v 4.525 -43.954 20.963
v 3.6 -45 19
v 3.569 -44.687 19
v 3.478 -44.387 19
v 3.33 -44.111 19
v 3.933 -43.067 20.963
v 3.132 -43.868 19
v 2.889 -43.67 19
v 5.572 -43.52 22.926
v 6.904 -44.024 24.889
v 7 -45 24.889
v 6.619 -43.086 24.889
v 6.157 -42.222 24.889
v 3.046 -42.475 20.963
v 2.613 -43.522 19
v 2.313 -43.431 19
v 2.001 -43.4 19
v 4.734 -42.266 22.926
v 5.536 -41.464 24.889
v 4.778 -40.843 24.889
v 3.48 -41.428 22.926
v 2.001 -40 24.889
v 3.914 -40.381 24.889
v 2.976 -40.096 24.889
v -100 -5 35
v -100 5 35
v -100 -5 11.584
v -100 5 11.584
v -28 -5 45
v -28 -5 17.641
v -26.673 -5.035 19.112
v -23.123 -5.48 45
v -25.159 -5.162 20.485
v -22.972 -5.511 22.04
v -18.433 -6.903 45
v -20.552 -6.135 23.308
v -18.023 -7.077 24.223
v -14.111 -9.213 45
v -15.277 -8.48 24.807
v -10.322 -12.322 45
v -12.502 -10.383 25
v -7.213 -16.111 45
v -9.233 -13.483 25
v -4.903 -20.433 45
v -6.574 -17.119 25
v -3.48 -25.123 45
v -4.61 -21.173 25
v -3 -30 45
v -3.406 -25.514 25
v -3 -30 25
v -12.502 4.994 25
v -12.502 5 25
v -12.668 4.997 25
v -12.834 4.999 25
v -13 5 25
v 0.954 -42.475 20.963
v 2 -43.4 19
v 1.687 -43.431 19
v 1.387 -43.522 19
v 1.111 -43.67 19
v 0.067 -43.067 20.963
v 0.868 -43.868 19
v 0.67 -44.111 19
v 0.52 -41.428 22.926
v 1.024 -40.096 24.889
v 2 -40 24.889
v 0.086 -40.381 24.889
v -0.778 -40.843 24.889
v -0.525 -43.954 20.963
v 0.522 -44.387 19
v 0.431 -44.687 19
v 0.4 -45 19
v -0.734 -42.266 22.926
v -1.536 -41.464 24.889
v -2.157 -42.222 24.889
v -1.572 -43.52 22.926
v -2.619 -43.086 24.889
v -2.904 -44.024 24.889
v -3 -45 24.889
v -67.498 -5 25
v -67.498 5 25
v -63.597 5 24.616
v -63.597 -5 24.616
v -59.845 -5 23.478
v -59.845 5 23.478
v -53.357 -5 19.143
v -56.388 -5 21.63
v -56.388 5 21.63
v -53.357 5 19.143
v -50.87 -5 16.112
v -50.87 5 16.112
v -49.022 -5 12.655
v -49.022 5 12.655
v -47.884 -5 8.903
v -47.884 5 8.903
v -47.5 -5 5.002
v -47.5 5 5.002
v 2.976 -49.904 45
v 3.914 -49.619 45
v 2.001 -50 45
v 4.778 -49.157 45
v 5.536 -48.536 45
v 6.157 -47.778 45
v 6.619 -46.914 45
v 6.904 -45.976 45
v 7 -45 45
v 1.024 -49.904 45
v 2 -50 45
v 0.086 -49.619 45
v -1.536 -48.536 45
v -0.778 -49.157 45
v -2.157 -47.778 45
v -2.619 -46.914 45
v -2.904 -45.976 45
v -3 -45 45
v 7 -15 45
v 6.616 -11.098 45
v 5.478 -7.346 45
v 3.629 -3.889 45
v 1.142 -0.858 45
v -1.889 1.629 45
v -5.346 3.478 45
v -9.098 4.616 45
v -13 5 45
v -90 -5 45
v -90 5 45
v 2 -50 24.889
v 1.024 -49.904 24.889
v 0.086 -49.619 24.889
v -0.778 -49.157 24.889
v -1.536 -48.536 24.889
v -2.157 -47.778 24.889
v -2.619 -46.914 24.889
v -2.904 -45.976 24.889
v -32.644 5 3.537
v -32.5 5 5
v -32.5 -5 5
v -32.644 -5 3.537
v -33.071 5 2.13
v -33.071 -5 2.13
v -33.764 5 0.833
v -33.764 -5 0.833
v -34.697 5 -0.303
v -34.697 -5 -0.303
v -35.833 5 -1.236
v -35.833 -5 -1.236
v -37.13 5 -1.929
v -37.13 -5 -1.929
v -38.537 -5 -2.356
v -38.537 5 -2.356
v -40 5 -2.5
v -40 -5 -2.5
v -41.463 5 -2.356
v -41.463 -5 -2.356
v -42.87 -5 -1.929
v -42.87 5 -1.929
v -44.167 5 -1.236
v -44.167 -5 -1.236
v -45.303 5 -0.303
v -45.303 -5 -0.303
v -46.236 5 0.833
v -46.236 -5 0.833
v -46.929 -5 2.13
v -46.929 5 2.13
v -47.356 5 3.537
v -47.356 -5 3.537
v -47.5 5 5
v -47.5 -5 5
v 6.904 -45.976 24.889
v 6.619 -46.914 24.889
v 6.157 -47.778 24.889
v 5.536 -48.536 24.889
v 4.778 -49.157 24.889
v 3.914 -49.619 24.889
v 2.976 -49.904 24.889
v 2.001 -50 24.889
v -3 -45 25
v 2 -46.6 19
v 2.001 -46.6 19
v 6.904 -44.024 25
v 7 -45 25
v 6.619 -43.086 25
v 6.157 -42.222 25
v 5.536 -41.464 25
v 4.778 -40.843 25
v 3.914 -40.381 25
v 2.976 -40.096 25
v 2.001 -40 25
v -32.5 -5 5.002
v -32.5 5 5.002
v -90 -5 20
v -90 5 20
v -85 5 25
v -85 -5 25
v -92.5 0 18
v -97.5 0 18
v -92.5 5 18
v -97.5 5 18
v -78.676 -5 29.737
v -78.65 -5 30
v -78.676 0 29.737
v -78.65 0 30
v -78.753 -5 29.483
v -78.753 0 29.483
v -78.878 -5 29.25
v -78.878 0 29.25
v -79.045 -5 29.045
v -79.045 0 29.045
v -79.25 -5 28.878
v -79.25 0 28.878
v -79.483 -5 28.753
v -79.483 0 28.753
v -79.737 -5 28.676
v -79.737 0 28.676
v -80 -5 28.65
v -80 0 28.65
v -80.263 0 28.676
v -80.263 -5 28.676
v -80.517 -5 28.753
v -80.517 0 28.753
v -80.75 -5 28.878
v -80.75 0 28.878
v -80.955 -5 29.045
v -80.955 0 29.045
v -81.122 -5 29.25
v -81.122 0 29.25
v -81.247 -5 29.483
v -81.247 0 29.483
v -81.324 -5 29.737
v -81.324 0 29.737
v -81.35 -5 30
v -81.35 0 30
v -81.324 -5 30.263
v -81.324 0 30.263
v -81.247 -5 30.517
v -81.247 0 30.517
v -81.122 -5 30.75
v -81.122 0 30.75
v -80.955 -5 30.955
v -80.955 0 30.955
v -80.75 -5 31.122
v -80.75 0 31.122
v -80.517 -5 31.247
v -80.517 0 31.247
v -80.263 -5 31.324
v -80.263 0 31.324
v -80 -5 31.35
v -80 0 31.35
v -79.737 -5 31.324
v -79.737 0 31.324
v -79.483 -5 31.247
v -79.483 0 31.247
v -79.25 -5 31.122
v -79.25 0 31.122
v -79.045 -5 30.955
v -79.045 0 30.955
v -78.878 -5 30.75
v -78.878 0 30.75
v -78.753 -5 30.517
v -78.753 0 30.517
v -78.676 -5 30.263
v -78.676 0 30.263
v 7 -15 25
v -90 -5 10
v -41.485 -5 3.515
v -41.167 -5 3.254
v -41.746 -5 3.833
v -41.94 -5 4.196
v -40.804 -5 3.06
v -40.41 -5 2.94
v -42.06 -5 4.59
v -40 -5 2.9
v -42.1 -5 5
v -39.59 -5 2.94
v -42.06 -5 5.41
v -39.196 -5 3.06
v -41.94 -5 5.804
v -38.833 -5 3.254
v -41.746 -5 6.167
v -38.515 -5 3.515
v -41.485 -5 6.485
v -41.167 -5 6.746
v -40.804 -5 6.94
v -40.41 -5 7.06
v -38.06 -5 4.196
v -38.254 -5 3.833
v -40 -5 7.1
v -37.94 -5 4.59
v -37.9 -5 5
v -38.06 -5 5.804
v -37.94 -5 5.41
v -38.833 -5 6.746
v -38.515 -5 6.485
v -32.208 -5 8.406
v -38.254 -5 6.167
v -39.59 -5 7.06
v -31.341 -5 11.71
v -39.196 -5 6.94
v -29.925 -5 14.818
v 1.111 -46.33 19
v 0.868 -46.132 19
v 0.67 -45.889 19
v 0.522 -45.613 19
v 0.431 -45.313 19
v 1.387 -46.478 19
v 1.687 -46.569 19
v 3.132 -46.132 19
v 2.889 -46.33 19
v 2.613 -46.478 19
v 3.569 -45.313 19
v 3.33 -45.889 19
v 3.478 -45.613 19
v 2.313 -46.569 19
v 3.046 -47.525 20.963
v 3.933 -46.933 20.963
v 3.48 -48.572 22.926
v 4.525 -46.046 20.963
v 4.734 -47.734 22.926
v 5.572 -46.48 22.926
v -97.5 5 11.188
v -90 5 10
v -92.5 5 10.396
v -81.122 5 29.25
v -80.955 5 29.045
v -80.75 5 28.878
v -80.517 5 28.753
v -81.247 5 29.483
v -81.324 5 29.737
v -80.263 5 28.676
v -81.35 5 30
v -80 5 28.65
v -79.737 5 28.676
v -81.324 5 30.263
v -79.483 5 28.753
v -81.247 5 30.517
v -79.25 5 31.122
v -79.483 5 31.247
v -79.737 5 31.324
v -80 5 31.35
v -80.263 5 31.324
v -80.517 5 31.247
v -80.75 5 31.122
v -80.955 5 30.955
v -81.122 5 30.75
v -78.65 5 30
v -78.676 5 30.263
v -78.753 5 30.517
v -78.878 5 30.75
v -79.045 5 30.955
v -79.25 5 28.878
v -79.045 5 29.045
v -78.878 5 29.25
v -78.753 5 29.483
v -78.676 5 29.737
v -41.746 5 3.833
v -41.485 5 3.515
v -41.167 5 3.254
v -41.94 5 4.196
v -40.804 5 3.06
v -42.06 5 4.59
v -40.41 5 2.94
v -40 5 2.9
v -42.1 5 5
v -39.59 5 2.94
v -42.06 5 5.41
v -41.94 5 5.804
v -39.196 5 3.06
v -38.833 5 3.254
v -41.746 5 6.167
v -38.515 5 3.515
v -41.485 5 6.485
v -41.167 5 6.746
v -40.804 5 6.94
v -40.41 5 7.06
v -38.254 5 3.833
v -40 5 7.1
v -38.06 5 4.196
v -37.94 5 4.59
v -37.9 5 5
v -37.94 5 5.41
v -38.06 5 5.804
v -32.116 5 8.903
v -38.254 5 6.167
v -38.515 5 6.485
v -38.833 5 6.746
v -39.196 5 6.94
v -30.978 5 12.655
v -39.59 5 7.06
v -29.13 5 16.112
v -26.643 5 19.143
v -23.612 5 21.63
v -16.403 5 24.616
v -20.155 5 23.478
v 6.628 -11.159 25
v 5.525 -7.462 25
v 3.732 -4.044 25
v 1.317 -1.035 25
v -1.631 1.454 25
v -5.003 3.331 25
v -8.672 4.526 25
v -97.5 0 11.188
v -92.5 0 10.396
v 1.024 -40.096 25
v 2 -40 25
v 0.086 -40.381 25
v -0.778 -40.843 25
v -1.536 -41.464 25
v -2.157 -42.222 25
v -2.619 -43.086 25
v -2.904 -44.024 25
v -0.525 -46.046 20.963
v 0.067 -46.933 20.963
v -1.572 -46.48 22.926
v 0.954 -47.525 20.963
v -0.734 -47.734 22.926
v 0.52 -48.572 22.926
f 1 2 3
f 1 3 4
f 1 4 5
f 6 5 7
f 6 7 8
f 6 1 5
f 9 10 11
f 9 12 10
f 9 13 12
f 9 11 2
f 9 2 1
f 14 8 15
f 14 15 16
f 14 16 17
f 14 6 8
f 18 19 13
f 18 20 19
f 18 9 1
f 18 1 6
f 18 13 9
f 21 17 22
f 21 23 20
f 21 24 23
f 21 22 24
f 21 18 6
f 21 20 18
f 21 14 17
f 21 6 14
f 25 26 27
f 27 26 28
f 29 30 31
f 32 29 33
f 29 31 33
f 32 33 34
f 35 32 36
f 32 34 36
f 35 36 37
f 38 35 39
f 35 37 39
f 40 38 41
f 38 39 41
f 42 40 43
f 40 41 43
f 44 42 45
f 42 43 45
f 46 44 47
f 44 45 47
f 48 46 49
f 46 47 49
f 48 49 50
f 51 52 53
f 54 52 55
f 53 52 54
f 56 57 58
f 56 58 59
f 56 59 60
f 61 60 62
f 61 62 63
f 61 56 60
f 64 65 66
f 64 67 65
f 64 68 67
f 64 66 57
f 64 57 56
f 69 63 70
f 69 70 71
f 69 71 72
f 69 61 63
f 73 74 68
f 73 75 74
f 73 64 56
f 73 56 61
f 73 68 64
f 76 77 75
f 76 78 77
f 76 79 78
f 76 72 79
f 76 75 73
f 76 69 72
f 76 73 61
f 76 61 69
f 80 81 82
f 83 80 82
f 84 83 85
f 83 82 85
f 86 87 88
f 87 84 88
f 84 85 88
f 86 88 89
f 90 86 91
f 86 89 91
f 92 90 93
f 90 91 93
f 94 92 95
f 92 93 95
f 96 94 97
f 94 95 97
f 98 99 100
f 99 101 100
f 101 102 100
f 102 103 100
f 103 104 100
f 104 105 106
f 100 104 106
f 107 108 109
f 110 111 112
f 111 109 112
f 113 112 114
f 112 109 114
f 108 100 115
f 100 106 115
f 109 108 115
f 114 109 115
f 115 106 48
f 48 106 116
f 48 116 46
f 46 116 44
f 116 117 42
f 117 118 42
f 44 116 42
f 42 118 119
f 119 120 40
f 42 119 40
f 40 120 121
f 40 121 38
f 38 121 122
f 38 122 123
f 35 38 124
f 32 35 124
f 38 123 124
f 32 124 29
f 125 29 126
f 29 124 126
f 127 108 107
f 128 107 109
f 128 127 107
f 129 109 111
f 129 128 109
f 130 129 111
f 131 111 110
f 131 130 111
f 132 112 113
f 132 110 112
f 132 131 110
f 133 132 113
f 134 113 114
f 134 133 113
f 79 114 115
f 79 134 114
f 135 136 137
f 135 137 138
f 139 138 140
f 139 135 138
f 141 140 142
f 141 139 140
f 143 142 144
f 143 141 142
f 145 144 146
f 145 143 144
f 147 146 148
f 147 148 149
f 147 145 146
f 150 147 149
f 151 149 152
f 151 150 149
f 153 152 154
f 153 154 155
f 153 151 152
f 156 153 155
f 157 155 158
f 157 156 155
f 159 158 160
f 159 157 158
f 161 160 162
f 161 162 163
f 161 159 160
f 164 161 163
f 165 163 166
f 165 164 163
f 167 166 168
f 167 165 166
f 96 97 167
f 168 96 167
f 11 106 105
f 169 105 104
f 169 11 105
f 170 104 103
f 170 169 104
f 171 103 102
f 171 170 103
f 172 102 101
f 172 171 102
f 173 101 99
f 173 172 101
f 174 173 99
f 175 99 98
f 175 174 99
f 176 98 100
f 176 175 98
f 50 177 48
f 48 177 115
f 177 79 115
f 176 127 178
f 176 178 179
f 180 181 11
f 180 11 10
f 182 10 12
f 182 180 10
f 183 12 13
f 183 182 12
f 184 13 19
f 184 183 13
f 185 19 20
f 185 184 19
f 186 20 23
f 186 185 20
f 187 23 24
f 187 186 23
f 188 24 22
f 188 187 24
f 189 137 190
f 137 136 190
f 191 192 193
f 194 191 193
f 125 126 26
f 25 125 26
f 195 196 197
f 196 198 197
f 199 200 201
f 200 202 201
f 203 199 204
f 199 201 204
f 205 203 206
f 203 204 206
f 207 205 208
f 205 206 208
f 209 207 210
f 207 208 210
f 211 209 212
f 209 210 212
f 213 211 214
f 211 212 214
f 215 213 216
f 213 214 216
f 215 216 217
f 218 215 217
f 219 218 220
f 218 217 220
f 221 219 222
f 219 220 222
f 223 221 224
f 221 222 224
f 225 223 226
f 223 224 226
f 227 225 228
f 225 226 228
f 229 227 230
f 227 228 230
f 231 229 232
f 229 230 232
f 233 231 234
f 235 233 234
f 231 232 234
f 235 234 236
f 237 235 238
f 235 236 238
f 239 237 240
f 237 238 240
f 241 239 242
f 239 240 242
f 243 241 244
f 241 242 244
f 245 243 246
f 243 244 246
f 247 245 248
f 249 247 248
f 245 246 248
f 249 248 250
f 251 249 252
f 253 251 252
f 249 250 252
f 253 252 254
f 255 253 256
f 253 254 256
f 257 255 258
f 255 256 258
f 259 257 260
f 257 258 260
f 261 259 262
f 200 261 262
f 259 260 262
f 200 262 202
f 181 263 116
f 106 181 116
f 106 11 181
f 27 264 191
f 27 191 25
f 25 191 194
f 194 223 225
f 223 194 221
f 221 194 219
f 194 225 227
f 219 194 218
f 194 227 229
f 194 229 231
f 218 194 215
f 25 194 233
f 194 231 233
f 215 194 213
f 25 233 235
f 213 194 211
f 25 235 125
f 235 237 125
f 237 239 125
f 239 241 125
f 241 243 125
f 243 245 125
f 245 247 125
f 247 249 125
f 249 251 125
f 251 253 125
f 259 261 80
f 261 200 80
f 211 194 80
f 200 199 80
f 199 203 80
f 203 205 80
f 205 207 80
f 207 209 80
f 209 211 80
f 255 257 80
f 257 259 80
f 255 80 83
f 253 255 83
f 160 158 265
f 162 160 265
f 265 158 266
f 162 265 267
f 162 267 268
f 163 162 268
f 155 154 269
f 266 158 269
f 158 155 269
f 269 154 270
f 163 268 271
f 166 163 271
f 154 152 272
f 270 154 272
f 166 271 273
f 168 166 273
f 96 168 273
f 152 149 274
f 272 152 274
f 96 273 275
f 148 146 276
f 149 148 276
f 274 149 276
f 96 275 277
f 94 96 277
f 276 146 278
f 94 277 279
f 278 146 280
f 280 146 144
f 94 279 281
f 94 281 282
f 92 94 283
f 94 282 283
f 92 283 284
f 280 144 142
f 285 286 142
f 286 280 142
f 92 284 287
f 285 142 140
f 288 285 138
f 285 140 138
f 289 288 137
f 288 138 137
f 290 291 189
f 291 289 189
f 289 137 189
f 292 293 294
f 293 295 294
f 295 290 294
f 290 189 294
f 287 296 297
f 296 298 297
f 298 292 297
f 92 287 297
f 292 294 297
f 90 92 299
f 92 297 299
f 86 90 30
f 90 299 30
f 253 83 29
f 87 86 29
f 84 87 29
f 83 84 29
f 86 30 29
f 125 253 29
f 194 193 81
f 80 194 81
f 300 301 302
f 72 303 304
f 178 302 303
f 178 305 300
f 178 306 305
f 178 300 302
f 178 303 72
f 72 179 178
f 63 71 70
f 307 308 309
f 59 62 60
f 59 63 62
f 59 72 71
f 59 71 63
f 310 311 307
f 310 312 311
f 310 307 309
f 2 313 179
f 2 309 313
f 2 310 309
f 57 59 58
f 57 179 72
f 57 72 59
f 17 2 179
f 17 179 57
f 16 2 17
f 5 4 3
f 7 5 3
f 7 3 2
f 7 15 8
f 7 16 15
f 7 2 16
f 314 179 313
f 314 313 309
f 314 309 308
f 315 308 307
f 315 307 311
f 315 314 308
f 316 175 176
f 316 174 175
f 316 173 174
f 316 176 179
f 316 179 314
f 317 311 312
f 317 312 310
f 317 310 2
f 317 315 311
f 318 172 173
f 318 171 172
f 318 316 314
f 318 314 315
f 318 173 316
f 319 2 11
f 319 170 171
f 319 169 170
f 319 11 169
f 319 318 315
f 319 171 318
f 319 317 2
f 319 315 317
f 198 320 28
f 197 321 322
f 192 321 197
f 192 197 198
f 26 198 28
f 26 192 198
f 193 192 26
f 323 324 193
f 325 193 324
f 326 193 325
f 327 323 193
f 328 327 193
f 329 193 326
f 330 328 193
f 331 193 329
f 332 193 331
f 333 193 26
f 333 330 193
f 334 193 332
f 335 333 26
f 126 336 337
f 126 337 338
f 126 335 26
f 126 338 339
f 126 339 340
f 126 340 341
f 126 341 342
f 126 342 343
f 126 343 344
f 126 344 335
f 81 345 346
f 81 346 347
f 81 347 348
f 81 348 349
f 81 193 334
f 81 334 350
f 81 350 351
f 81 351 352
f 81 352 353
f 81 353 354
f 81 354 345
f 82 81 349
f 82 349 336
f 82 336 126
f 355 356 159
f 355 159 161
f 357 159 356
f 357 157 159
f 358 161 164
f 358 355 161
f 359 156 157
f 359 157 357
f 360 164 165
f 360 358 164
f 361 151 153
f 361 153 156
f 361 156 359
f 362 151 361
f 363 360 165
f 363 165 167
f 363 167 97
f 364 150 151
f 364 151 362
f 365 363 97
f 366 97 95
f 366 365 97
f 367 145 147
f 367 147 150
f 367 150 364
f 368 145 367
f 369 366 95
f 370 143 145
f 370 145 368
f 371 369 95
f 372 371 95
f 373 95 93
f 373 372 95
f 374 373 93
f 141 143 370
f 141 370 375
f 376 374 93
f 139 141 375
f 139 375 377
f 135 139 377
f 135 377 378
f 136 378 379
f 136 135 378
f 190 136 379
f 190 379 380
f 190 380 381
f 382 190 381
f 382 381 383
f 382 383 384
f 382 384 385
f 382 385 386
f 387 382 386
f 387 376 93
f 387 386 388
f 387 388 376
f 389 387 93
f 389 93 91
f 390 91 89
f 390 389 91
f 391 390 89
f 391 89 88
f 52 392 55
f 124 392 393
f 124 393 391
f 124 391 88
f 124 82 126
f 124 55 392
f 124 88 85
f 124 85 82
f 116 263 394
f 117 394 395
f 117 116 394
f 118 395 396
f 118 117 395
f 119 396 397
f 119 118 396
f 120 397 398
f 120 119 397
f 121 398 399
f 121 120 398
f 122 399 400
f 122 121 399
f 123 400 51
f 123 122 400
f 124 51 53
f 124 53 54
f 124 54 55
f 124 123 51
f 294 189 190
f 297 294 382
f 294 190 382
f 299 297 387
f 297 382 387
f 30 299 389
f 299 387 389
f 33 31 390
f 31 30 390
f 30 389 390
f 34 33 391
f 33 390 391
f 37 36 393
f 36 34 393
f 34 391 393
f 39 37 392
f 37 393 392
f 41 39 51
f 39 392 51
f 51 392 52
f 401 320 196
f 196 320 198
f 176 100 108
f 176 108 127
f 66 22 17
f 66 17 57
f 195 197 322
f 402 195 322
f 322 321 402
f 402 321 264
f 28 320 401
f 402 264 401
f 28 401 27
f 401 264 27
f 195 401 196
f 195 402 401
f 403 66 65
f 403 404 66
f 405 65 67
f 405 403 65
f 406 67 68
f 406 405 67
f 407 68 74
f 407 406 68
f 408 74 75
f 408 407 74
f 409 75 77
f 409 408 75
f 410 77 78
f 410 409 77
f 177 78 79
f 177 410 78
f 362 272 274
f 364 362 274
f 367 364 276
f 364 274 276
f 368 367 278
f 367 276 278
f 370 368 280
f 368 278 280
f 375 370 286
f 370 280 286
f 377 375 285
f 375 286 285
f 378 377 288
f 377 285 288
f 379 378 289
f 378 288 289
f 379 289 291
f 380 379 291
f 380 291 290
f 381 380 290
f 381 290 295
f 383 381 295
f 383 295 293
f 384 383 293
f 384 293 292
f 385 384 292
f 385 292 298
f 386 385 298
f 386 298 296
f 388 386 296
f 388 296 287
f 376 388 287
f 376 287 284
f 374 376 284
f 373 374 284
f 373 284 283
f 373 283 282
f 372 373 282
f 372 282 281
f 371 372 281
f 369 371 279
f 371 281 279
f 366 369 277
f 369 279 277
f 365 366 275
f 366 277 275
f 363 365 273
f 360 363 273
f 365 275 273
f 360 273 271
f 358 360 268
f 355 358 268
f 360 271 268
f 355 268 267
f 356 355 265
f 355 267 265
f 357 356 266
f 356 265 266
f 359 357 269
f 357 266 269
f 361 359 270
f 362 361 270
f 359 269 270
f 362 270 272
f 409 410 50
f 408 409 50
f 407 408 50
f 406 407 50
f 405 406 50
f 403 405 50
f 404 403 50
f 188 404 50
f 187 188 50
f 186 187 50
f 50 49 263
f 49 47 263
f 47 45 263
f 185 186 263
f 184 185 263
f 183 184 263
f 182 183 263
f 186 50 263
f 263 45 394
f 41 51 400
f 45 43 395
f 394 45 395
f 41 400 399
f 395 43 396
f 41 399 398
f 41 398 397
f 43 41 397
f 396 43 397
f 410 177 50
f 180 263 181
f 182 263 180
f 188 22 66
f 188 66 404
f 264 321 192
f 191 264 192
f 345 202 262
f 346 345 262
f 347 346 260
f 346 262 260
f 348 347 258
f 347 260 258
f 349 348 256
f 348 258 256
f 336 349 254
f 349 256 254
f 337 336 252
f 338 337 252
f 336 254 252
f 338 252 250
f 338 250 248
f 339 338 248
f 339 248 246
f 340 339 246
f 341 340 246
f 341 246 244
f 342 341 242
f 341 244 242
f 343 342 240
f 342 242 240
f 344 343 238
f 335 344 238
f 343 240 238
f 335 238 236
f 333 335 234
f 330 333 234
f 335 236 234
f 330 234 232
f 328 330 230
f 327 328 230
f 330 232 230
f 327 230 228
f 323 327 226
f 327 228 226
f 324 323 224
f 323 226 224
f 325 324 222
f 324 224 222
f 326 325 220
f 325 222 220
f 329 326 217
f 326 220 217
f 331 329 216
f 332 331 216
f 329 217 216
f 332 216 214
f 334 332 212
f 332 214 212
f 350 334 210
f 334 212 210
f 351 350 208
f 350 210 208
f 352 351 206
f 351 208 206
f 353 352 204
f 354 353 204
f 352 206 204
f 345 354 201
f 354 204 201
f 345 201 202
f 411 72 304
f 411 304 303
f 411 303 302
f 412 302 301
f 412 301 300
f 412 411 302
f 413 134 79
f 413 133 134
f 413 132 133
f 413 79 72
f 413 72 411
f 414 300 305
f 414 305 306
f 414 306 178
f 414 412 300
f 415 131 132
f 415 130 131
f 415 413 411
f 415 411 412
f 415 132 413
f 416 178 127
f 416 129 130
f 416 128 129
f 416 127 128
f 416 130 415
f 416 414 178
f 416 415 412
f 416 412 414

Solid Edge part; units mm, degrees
sketch "Sketch1" plane through (0, 0, 0) normal (0, -1, 0) x (1, 0, 0)
  line L0 (7, 45) -> (7, 25)
  line L1 (-32.5, 25) -> (7, 25)
  line L2 (-32.5, 5) -> (-32.5, 25)
  arc A0 (-32.5, 5) -> (-47.5, 5) centre (-40, 5) cw
  line L3 (-47.5, 25) -> (-47.5, 5)
  line L4 (-85, 25) -> (-47.5, 25)
  line L5 (-90, 20) -> (-85, 25)
  line L6 (-90, 10) -> (-90, 20)
  line L7 (-100, 10) -> (-90, 10)
  line L8 (-100, 35) -> (-100, 10)
  line L9 (-90, 45) -> (-100, 35)
  line L10 (7, 45) -> (-90, 45)
  dimension "D1" = 10
  dimension "D2" = 10
  dimension "D3" = 10
  dimension "D4" = 100
  dimension "D5" = 15
  dimension "D6" = 5
  dimension "D7" = 7
  dimension "D8" = 5
  dimension "D9" = 40
extrude "Protrusion1" add sketch "Sketch1" along normal mid plane 10
sketch "Sketch2" plane through (0, 0, 0) normal (0, -1, 0) x (1, 0, 0)
  circle A0 centre (-80, 30) radius 1.35
  dimension "D1" = 30
  dimension "D2" = 80
extrude "ExtrudedCutout_3" cut sketch "Sketch2" along normal mid plane 29.2691
hole "Hole_1" at (-40, -5, 5) direction (0, 1, 0) diameter 4.2 end up to next
fillet "Round_7" radius 20 2 edges at (-47.5, 0, 25) (-32.5, 0, 25)
sketch "Sketch3" plane through (7, 0, 30) normal (1, 0, 0) x (0, 1, 0)
  line L0 (5, 15) -> (-50, 15)
  line L1 (-50, 15) -> (-50, -11)
  line L2 (-50, -11) -> (-40, -11)
  line L3 (-40, -11) -> (-40, -5)
  line L4 (-40, -5) -> (5, -5)
  line L5 (5, -5) -> (5, 15)
  dimension "D1" = 10
  dimension "D2" = 6
extrude "ExtrudedProtrusion_3" add sketch "Sketch3" against normal blind 10
fillet "Round_8" radius 5 4 edges at (-3, -50, 32) (7, -50, 32) (-3, -40, 22) (7, -40, 22)
chamfer "Chamfer_5" distance 3.4 angle 60 1 edges at (7, -45, 19) measured on face at (-1.2333, -48.4333, 19)
fillet "Round_9" radius 20 1 edges at (7, 5, 35)
fillet "Round_10" radius 25 1 edges at (-3, -5, 35)
sketch "Sketch4" plane through (-50, 5, 17.5) normal (0, 1, 0) x (1, 0, 0)
  line L0 (-47.5, 7.5) -> (-47.5, -0.5)
  line L1 (-47.5, -0.5) -> (-42.5, -0.5)
  line L2 (-42.5, -0.5) -> (-42.5, 7.5)
  line L3 (-42.5, 7.5) -> (-47.5, 7.5)
  dimension "D1" = 5
  dimension "D2" = 8
extrude "ExtrudedCutout_5" cut sketch "Sketch4" against normal blind 5
sketch "Sketch5" plane through (-65, -5, 17.5) normal (0, -1, 0) x (1, 0, 0)
  line L0 (-25, -7.5) -> (-35, -5.9162)
  line L1 (-35, -5.9162) -> (-35, -7.5)
  line L2 (-35, -7.5) -> (-25, -7.5)
extrude "ExtrudedCutout_6" cut sketch "Sketch5" against normal blind 31.7921
properties material "PPA-CF"
